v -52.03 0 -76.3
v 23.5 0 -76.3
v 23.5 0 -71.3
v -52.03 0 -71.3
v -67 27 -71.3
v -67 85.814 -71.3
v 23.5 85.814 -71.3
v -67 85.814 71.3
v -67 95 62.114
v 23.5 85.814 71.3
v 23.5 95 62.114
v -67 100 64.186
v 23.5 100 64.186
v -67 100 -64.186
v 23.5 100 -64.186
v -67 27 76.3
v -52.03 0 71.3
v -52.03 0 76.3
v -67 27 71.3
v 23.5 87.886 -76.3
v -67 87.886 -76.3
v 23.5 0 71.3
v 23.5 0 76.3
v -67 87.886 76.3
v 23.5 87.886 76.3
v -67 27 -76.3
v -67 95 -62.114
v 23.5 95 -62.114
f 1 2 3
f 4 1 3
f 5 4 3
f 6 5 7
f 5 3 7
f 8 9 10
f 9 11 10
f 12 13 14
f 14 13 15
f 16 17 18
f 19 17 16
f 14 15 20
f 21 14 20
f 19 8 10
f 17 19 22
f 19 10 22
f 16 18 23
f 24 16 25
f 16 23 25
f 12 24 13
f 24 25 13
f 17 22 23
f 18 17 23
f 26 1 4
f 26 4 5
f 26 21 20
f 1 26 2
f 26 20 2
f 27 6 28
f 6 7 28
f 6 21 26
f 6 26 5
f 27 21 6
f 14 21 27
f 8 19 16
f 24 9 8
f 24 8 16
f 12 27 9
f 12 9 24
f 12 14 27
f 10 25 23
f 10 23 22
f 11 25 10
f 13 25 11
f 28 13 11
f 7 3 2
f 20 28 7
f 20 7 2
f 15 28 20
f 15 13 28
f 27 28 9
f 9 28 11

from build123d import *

# Parameters (mm, degrees)
SKETCH1_W           = 73.5
SKETCH1_H           = 5
BOSS_EXTRUDE1_DEPTH = 17
CUT_EXTRUDE1_DEPTH  = 195.359872402


with BuildPart() as part:
    # Sweep3: sweep along a path in Sketch2
    with BuildLine(Plane(origin=(0, 0, 0), x_dir=(0, 0, -1), z_dir=(1, 0, 0))) as sweep3_path:
        Line((-73.8, 0), (-73.8, 86.85))
        Line((-73.8, 86.85), (-63.15, 97.5))
        Line((-63.15, 97.5), (63.15, 97.5))
        Line((63.15, 97.5), (73.8, 86.85))
        Line((73.8, 86.85), (73.8, 0))
    # Sketch1 → Sweep3 (sweep)
    with BuildSketch(Plane(origin=(0, 0, 0), x_dir=(1, 0, 0), z_dir=(0, 1, 0))):
        with Locations((-13.25, -73.8)):
            Rectangle(SKETCH1_W, SKETCH1_H)
    sweep(path=sweep3_path.line, transition=Transition.RIGHT)

    # Sketch5 → Boss-Extrude1 (add)
    with BuildSketch(Plane.ZY.offset(50)):
        Polygon((-76.3, 0), (-71.3, 0), (-71.3, 85.814466094), (-62.114466094, 95), (62.114466094, 95), (71.3, 85.814466094), (71.3, 0), (76.3, 0), (76.3, 87.885533906), (64.185533906, 100), (-64.185533906, 100), (-76.3, 87.885533906), align=None)
    extrude(amount=BOSS_EXTRUDE1_DEPTH)

    # Sketch6 → Cut-Extrude1 (cut, through all)
    with BuildSketch(Plane(origin=(0, 0, -76.3), x_dir=(-1, 0, 0), z_dir=(0, 0, -1))):
        Polygon((52.03, 0), (67, 27), (67, 0), align=None)
    extrude(amount=-CUT_EXTRUDE1_DEPTH, mode=Mode.SUBTRACT)


solid = part.part
